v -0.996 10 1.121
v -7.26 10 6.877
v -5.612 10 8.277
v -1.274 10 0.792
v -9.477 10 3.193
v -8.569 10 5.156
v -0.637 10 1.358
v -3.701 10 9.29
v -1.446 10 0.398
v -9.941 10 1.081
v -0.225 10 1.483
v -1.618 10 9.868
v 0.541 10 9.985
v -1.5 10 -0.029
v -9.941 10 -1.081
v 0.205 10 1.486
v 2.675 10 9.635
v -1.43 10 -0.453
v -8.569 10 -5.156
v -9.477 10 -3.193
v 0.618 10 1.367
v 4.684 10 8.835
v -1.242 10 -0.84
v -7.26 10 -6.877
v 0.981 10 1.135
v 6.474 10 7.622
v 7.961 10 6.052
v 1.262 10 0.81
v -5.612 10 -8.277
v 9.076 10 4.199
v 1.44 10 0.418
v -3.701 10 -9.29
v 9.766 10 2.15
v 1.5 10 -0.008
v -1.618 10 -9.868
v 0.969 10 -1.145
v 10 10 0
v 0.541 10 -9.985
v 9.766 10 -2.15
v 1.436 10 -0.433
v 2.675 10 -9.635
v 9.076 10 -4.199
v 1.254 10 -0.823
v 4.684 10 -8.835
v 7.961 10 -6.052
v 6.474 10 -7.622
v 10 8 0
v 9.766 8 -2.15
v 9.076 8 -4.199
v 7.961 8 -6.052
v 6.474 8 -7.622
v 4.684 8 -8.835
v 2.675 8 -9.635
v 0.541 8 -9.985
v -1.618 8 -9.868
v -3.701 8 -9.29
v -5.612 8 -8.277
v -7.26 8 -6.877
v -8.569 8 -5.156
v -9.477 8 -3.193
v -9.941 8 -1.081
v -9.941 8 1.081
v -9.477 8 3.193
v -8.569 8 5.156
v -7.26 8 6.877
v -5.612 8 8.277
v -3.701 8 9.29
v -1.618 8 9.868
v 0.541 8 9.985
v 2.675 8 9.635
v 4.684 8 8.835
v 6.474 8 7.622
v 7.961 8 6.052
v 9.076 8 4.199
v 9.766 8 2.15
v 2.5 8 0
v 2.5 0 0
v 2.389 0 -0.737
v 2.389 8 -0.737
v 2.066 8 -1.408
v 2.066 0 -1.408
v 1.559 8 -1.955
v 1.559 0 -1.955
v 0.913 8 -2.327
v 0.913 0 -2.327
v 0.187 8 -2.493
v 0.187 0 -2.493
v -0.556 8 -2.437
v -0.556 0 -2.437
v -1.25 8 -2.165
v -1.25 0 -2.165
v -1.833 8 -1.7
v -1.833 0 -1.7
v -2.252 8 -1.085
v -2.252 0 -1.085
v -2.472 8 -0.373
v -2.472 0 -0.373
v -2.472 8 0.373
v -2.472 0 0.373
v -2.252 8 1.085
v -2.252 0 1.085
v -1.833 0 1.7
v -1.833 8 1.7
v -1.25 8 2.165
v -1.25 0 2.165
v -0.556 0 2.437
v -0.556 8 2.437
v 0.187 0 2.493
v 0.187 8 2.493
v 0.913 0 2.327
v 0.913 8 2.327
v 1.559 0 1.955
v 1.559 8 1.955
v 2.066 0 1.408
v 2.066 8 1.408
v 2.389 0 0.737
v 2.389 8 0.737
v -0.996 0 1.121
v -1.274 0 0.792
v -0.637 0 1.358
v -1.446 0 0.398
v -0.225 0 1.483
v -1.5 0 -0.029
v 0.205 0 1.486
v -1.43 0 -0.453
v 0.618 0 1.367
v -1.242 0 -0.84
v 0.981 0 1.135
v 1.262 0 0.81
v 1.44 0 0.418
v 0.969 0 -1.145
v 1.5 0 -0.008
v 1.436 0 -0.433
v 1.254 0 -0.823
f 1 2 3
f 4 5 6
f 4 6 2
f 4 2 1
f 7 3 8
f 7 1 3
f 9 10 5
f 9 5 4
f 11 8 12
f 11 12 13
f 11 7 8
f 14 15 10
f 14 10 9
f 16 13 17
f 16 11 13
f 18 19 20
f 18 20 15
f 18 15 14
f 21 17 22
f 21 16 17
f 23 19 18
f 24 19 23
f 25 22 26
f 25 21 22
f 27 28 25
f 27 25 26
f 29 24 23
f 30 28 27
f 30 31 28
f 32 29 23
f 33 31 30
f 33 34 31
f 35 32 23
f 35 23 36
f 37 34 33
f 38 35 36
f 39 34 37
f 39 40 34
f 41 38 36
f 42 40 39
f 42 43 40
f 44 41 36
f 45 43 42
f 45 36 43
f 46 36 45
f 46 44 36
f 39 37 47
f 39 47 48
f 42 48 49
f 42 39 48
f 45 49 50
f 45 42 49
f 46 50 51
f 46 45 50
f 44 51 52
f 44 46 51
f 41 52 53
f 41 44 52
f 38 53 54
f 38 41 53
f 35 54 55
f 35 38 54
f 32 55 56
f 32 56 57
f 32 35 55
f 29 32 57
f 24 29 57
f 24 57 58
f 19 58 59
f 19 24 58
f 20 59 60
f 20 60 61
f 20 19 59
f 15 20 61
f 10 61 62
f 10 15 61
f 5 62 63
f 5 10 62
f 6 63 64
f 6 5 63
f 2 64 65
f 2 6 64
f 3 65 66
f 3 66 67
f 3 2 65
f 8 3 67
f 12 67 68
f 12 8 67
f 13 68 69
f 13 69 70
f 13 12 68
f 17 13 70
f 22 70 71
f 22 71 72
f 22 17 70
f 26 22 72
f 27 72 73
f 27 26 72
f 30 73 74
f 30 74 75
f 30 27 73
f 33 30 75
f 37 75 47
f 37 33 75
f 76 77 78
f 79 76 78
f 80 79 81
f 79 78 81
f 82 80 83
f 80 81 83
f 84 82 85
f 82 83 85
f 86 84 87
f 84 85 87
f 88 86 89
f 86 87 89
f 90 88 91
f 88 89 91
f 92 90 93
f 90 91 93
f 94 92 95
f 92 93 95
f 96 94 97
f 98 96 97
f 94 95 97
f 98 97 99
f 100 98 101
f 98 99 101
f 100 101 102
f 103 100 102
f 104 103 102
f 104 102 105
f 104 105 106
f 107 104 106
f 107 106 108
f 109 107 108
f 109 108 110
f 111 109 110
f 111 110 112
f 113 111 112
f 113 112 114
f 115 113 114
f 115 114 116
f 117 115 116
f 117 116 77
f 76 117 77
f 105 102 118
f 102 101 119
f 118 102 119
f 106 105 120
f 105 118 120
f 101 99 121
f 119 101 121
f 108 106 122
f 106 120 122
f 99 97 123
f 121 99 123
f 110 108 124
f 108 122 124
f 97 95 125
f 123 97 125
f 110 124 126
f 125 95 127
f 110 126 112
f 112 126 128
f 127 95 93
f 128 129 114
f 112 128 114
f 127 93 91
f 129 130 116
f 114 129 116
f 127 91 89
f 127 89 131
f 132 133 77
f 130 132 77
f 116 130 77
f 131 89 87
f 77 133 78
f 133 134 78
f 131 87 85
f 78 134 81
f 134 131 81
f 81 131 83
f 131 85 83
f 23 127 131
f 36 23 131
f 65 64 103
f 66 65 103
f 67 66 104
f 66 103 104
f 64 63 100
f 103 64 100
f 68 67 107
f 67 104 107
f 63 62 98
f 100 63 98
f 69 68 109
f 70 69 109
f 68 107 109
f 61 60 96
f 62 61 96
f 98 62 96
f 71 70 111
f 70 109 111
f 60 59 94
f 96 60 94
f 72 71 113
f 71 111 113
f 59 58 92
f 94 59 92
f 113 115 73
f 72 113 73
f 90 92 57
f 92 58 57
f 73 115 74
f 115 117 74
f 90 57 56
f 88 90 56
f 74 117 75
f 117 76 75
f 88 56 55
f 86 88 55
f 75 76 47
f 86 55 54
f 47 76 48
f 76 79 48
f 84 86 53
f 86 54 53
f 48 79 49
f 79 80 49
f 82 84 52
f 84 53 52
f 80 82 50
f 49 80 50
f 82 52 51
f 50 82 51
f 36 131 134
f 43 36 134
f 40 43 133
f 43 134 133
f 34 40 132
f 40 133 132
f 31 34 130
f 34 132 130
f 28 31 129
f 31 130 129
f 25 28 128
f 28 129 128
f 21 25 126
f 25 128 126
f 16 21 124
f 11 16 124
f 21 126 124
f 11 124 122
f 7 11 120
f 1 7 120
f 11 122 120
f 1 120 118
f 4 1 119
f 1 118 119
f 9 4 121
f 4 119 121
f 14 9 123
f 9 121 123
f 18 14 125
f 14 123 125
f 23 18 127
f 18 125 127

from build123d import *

# Parameters (mm, degrees)
SKETCH1_R           = 2.5
BOSS_EXTRUDE1_DEPTH = 10
SKETCH3_R           = 10
SKETCH3_R_2         = 2.5
BOSS_EXTRUDE2_DEPTH = 2


with BuildPart() as part:
    # Sketch1 → Boss-Extrude1 (new body)
    with BuildSketch(Plane(origin=(0, 0, 0), x_dir=(1, 0, 0), z_dir=(0, 1, 0))):
        Circle(SKETCH1_R)
        with BuildLine():
            Line((-1.242447099, 0.840431559), (0.968768208, 1.14513458))
            ThreePointArc((0.968768208, 1.14513458), (0.204756352, -1.485907091), (-1.242447099, 0.840431559))
        make_face(mode=Mode.SUBTRACT)
    extrude(amount=BOSS_EXTRUDE1_DEPTH)

    # Sketch3 → Boss-Extrude2 (add)
    with BuildSketch(Plane(origin=(0, 10, 0), x_dir=(1, 0, 0), z_dir=(0, 1, 0))):
        Circle(SKETCH3_R)
        Circle(SKETCH3_R_2, mode=Mode.SUBTRACT)
    extrude(amount=-BOSS_EXTRUDE2_DEPTH)


solid = part.part
